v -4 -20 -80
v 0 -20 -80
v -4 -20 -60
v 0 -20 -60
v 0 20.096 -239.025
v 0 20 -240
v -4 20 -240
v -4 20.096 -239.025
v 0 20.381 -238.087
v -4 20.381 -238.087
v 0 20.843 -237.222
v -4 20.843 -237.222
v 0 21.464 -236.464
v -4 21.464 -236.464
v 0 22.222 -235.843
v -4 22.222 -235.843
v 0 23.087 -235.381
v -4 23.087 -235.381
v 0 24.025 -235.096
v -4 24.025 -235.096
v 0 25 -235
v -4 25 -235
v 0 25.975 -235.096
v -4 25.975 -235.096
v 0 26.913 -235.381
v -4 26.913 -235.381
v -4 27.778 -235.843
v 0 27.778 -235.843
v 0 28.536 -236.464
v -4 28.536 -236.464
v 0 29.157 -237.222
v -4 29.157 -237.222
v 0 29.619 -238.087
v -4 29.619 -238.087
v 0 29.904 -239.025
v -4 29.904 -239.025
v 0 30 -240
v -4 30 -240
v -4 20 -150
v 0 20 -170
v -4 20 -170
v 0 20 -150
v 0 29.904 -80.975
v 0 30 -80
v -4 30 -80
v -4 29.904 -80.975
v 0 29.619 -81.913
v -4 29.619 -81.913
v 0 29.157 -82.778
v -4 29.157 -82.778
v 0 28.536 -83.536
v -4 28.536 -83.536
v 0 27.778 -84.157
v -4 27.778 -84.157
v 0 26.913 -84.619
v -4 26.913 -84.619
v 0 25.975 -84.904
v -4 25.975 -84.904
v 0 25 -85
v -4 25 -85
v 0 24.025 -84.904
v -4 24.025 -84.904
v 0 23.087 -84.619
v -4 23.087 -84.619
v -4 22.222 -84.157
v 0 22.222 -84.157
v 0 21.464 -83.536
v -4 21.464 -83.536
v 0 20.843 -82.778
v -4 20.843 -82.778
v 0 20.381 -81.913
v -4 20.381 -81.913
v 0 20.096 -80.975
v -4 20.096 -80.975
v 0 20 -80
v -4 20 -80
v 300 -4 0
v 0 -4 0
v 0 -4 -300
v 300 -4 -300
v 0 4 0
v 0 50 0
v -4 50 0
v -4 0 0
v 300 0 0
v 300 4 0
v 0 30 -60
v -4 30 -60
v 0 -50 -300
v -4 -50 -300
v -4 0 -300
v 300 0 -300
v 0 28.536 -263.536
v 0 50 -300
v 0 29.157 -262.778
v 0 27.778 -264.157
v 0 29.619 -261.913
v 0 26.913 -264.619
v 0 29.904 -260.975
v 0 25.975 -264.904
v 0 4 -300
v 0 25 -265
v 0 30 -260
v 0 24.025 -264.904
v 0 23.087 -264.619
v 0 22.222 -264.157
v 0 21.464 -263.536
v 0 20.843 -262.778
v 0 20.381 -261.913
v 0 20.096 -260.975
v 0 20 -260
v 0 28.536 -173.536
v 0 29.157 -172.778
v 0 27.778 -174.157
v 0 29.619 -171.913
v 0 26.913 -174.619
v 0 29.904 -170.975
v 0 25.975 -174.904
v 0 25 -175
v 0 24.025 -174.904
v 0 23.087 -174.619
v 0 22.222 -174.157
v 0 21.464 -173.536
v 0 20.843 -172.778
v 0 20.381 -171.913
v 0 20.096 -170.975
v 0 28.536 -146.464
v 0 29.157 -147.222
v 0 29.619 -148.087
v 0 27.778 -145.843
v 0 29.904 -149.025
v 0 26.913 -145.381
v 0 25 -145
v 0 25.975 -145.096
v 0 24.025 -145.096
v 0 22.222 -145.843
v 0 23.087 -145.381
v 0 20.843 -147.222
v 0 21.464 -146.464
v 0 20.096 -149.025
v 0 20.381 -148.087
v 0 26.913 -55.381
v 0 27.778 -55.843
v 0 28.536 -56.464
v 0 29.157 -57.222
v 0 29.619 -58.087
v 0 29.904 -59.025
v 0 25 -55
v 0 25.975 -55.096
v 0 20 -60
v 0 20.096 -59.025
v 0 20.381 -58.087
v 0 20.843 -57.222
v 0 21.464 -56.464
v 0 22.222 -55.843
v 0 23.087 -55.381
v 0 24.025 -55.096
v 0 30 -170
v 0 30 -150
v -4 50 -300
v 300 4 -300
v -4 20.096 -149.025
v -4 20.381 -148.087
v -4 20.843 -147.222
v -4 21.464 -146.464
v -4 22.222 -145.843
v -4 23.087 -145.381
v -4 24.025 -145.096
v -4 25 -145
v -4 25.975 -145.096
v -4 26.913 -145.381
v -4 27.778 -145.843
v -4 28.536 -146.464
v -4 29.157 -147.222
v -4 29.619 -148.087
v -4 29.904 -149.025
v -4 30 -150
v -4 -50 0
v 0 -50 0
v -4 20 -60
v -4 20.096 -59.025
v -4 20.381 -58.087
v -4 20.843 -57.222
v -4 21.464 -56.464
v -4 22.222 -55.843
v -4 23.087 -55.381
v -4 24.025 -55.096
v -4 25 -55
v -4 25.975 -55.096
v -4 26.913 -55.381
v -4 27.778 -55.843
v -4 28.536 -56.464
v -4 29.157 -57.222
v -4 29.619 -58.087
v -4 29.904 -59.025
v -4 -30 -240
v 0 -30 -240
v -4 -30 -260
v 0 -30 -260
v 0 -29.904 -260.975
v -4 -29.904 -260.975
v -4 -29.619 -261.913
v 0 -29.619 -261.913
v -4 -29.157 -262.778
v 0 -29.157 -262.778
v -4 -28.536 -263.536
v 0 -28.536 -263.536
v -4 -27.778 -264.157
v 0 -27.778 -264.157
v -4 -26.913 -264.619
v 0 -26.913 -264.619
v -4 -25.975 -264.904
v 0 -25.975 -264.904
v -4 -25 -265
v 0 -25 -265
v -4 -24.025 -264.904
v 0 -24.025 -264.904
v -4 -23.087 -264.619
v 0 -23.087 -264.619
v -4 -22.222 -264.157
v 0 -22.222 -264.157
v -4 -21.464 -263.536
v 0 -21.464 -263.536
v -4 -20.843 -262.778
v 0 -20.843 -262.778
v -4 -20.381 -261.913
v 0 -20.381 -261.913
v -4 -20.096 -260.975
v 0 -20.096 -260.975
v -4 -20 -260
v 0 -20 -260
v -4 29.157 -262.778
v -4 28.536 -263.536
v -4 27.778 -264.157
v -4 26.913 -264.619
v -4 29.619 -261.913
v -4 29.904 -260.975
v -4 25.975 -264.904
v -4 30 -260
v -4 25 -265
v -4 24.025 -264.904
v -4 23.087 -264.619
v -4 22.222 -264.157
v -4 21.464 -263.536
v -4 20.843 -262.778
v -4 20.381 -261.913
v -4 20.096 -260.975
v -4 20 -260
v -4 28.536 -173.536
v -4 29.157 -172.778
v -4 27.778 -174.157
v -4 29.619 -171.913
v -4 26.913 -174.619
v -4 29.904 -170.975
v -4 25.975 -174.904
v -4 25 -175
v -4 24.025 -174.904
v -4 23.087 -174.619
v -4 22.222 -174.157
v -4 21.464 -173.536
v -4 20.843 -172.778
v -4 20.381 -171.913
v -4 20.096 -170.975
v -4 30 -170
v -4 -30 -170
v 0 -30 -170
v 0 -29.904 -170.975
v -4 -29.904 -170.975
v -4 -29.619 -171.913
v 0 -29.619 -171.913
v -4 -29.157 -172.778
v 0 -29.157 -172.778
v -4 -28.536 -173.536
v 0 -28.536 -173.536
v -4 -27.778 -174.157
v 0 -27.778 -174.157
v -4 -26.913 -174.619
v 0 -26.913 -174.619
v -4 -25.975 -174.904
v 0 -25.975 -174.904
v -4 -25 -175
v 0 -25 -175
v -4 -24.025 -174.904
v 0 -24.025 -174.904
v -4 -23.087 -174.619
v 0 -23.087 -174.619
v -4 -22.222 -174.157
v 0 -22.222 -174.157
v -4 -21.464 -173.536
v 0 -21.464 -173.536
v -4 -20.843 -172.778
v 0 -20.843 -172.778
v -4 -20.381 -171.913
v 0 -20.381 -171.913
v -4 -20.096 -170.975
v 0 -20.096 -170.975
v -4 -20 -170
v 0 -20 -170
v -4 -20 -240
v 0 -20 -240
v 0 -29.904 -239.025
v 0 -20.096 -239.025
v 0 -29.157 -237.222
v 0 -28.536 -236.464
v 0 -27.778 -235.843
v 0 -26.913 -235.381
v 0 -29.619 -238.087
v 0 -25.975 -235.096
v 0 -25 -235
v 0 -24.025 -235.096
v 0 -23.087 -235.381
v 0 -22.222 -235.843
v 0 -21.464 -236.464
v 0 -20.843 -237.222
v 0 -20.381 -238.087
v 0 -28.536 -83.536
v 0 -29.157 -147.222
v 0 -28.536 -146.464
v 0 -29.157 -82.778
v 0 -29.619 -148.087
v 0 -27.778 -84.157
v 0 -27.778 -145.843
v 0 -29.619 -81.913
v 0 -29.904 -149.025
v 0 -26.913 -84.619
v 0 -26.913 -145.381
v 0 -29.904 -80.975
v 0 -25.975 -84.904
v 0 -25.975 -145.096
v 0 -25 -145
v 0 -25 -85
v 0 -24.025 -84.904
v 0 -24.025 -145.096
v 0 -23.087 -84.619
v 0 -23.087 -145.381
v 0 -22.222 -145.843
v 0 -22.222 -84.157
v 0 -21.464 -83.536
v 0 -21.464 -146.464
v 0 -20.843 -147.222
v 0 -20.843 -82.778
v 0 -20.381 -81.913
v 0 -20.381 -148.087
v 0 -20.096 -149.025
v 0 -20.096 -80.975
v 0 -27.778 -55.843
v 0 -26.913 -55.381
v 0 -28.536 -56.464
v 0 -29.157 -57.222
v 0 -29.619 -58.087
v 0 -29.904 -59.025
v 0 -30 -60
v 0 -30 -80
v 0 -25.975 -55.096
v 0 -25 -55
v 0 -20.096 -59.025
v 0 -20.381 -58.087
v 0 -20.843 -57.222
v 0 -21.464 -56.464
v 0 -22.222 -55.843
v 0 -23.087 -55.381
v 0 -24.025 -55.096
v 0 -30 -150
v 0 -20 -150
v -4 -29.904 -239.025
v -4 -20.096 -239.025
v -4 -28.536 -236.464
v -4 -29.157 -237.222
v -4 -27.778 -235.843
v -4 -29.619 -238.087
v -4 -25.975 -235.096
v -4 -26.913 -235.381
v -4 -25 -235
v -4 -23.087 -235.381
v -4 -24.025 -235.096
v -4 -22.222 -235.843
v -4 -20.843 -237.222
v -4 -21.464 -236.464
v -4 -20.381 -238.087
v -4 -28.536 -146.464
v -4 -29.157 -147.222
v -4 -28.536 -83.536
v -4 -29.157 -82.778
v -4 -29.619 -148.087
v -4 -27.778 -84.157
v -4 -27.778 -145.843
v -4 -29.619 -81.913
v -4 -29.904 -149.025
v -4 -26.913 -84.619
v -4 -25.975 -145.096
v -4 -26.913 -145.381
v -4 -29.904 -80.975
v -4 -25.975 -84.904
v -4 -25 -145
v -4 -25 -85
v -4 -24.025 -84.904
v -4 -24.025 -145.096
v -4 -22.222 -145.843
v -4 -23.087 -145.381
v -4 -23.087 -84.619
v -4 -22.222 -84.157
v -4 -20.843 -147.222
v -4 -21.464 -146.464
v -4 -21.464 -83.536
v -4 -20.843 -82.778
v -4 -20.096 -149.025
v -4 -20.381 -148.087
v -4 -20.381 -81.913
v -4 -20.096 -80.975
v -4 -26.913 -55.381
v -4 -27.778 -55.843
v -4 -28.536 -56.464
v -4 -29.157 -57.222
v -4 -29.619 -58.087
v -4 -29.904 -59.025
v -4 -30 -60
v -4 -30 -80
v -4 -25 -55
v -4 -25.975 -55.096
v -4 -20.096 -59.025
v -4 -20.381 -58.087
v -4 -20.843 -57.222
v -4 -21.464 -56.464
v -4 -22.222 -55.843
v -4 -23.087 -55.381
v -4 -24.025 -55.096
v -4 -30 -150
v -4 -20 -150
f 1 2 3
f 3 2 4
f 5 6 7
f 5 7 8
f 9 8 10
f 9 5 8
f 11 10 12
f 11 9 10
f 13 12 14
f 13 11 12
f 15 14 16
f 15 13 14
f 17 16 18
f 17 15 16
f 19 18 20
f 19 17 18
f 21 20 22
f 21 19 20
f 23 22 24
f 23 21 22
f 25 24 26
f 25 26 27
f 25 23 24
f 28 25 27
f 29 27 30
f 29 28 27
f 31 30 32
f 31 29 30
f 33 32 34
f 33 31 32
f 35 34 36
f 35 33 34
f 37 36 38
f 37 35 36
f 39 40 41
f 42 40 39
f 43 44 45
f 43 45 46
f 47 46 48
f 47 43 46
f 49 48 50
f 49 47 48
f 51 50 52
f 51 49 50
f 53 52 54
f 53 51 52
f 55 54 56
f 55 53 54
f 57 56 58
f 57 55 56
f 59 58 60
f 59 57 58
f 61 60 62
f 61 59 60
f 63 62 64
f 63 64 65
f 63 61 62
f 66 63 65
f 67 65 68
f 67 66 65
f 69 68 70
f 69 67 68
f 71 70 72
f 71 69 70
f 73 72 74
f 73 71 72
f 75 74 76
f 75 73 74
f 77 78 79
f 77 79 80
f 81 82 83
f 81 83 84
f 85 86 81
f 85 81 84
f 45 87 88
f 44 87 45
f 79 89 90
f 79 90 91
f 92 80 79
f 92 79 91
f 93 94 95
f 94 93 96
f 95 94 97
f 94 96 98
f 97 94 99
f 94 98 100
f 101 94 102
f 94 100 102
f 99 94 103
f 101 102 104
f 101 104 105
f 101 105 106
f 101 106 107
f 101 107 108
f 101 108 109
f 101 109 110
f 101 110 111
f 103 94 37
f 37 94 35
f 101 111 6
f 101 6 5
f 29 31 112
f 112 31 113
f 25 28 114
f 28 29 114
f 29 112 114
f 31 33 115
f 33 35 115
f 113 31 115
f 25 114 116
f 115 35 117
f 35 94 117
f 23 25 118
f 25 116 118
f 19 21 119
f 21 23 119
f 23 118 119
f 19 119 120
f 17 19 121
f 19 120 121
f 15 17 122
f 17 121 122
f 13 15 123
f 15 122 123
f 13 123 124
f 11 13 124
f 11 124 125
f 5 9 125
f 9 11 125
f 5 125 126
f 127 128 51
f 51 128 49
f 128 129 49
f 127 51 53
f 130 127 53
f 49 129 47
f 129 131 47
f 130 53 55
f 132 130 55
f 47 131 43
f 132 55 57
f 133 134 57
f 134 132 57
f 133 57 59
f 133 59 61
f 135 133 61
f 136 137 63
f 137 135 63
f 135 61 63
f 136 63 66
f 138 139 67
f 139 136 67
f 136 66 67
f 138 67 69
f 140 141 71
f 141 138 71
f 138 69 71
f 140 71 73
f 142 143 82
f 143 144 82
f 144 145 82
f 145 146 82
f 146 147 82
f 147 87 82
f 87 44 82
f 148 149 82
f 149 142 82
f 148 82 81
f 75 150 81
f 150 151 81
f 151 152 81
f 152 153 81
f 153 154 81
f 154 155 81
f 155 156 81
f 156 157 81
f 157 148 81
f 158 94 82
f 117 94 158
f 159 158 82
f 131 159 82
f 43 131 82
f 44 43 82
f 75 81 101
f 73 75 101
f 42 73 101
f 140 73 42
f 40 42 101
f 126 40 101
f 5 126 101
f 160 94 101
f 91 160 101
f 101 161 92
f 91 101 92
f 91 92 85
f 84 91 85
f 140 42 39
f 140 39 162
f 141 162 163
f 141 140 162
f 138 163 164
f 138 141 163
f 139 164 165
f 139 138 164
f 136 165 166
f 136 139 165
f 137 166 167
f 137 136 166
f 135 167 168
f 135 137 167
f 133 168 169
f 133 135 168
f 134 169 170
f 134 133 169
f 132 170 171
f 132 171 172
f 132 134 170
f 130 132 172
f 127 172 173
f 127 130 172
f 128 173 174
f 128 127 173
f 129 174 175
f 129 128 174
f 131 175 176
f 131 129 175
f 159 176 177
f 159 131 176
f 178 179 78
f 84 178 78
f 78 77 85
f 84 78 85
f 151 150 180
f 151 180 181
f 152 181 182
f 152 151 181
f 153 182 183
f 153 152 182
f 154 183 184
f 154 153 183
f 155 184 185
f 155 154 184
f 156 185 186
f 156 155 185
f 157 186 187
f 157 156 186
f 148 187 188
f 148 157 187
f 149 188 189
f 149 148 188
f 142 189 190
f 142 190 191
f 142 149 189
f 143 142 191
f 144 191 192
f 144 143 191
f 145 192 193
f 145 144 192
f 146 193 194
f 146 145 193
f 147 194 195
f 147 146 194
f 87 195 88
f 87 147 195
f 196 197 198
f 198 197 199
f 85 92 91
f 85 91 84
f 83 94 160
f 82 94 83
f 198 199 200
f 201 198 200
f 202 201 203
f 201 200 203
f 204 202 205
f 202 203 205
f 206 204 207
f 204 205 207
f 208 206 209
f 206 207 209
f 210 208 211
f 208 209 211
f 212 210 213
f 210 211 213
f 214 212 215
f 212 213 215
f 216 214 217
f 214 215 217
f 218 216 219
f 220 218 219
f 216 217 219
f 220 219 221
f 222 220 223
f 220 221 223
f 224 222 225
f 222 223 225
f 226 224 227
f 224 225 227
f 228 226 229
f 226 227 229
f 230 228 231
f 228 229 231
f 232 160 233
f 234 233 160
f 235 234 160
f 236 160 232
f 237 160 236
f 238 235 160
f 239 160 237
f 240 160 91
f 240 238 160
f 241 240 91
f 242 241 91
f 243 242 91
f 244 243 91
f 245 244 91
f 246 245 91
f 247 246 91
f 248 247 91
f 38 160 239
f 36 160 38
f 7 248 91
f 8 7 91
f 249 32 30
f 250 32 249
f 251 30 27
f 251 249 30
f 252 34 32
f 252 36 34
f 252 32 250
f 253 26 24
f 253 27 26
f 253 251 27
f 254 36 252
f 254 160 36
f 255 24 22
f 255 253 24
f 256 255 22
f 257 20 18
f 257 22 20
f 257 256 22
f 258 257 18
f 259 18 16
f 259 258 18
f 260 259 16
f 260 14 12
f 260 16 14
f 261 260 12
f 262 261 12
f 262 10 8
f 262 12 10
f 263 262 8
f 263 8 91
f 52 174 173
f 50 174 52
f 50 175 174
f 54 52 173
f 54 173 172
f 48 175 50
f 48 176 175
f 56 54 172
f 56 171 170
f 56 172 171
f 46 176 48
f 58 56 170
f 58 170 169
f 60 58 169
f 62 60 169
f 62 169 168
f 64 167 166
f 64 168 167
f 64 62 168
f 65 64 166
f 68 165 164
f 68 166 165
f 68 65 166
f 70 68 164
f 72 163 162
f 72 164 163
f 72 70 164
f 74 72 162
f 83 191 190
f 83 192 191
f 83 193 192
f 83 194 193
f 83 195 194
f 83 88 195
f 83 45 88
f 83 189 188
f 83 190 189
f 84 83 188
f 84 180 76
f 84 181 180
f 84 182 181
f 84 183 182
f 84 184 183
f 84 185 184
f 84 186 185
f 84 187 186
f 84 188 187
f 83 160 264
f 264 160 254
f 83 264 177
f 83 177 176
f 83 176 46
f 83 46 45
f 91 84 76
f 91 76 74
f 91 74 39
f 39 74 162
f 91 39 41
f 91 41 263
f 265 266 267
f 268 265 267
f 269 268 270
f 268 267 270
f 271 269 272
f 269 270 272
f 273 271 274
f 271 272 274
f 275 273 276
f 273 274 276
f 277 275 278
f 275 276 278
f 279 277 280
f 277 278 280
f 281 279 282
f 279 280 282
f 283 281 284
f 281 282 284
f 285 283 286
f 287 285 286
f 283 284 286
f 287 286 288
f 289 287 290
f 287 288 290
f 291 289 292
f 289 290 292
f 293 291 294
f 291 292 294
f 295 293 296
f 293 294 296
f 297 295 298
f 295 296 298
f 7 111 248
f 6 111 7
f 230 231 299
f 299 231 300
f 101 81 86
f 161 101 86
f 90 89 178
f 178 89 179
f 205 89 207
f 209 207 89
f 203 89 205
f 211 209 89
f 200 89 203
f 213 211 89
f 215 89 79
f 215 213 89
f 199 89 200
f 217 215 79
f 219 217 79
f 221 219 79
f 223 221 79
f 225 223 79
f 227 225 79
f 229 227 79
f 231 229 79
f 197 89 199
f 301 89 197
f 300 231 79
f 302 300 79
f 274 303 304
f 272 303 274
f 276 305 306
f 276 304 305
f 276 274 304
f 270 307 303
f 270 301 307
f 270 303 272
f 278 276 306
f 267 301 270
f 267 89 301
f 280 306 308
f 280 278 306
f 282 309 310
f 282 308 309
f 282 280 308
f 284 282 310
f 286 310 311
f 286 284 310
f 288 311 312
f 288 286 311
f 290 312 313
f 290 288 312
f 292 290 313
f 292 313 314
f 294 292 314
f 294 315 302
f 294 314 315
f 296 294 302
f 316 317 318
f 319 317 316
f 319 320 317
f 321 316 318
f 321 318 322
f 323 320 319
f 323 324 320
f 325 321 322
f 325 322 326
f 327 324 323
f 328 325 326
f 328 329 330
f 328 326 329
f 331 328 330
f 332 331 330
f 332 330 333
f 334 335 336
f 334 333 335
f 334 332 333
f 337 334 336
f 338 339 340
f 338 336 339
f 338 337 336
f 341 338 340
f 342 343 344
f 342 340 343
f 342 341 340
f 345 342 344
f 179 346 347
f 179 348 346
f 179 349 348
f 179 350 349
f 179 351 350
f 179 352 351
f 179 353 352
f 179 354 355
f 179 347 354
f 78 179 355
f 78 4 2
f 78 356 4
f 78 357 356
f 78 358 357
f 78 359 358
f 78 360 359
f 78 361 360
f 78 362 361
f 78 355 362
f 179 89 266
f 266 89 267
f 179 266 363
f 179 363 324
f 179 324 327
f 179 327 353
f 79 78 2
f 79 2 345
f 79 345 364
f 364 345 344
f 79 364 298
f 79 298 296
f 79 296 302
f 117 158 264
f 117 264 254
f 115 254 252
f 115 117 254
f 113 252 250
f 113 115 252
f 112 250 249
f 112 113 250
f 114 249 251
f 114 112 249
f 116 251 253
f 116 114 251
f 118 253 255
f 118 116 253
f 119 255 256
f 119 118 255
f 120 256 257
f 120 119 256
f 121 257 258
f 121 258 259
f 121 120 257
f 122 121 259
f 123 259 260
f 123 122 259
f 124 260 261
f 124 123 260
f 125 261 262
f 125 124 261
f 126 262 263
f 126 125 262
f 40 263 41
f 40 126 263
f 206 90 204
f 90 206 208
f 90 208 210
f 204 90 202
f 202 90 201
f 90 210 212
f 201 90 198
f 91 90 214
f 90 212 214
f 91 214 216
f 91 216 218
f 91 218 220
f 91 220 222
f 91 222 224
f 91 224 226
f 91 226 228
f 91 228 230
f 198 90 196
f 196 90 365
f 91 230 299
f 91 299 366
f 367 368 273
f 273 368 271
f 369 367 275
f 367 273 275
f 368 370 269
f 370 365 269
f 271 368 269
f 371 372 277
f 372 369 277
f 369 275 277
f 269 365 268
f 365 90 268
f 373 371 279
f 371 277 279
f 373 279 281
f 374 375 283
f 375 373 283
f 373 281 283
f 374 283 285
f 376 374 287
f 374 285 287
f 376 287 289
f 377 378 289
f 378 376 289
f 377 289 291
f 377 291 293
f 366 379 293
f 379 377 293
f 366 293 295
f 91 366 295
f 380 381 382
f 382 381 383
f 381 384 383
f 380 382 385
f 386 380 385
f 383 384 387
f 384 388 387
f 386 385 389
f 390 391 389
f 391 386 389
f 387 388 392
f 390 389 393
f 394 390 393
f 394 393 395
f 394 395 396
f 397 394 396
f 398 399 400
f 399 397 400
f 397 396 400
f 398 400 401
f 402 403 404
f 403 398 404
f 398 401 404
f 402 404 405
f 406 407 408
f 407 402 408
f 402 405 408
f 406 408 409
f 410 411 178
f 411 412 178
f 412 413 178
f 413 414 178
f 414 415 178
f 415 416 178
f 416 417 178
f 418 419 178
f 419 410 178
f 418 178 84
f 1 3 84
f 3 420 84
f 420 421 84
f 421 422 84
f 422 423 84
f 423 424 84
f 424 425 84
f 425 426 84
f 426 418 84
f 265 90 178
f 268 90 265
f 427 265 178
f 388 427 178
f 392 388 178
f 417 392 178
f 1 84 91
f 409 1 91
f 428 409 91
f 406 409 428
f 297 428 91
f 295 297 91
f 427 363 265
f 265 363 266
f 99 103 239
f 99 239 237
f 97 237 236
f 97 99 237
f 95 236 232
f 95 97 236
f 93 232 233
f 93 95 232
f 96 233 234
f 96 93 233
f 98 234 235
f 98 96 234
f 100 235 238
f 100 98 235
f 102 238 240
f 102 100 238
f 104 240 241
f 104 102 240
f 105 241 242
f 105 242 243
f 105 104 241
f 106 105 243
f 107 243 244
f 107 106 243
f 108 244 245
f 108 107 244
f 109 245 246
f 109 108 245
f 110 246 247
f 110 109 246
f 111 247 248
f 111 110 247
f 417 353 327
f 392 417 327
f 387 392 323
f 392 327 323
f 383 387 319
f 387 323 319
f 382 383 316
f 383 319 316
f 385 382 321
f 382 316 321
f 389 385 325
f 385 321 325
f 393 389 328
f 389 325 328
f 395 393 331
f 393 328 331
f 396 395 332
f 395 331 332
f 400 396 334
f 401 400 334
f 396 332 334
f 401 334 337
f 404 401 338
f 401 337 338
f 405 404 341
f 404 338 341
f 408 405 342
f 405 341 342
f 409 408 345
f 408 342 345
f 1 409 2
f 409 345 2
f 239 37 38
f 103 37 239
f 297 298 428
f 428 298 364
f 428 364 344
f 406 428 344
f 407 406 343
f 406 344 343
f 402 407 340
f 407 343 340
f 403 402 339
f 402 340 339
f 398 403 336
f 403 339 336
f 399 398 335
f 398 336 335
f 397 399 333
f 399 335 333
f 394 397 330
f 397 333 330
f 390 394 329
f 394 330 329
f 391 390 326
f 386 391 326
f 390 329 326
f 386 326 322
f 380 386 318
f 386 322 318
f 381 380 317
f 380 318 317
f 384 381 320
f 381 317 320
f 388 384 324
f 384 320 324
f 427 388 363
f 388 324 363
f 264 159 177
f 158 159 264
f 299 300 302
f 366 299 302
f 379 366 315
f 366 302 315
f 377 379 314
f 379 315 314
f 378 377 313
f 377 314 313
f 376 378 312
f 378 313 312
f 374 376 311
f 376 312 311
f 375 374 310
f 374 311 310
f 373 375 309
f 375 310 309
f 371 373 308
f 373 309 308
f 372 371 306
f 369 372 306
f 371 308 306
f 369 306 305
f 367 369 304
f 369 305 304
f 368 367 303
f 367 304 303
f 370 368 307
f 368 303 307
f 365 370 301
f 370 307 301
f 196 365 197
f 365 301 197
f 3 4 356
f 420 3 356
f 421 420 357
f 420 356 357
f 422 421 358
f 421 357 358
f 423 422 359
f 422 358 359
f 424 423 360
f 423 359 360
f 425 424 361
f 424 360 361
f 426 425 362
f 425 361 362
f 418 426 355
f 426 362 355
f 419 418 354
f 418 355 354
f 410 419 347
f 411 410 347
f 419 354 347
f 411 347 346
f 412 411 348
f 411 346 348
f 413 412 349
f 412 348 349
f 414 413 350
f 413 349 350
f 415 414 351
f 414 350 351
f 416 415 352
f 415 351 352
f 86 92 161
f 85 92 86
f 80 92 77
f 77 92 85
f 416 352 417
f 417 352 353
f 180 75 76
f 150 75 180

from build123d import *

# Parameters (mm, degrees)
F0_W     = 300
F0_H     = 300
F1_DEPTH = 4
F2_W     = 50
F2_H     = 300
F3_DEPTH = 4
F5_DEPTH = 25


# Not quite as in the source:
# - the program builds the solid bodies; features that only make, move or delete a surface that nothing else refers to are left out


with BuildPart() as f1:
    # F0 (on Front) → F1 (new body)
    with BuildSketch(Plane.XZ):
        with Locations((150, -150)):
            Rectangle(F0_W, F0_H)
    extrude(amount=F1_DEPTH)

    # F2 (on Right) → F3 (join)
    with BuildSketch(Plane.YZ):
        with Locations((-25, -150)):
            Rectangle(F2_W, F2_H)
    extrude(amount=-F3_DEPTH)

    # F4 (on face) → F5 (cut)
    with BuildSketch(Plane.YZ):
        with BuildLine():
            Line((-20, -80), (-20, -60))
            ThreePointArc((-20, -60), (-25, -55), (-30, -60))
            Line((-30, -60), (-30, -80))
            ThreePointArc((-30, -80), (-25, -85), (-20, -80))
        make_face()
        with BuildLine():
            Line((-20, -170), (-20, -150))
            ThreePointArc((-20, -150), (-25, -145), (-30, -150))
            Line((-30, -150), (-30, -170))
            ThreePointArc((-30, -170), (-25, -175), (-20, -170))
        make_face()
        with BuildLine():
            Line((-20, -260), (-20, -240))
            ThreePointArc((-20, -240), (-25, -235), (-30, -240))
            Line((-30, -240), (-30, -260))
            ThreePointArc((-30, -260), (-25, -265), (-20, -260))
        make_face()
    extrude(amount=-F5_DEPTH, mode=Mode.SUBTRACT)


with BuildPart() as f8_1:
    # F8: instance of F1
    add(f1.part.mirror(Plane.XZ))


solid = Compound([f1.part, f8_1.part])
